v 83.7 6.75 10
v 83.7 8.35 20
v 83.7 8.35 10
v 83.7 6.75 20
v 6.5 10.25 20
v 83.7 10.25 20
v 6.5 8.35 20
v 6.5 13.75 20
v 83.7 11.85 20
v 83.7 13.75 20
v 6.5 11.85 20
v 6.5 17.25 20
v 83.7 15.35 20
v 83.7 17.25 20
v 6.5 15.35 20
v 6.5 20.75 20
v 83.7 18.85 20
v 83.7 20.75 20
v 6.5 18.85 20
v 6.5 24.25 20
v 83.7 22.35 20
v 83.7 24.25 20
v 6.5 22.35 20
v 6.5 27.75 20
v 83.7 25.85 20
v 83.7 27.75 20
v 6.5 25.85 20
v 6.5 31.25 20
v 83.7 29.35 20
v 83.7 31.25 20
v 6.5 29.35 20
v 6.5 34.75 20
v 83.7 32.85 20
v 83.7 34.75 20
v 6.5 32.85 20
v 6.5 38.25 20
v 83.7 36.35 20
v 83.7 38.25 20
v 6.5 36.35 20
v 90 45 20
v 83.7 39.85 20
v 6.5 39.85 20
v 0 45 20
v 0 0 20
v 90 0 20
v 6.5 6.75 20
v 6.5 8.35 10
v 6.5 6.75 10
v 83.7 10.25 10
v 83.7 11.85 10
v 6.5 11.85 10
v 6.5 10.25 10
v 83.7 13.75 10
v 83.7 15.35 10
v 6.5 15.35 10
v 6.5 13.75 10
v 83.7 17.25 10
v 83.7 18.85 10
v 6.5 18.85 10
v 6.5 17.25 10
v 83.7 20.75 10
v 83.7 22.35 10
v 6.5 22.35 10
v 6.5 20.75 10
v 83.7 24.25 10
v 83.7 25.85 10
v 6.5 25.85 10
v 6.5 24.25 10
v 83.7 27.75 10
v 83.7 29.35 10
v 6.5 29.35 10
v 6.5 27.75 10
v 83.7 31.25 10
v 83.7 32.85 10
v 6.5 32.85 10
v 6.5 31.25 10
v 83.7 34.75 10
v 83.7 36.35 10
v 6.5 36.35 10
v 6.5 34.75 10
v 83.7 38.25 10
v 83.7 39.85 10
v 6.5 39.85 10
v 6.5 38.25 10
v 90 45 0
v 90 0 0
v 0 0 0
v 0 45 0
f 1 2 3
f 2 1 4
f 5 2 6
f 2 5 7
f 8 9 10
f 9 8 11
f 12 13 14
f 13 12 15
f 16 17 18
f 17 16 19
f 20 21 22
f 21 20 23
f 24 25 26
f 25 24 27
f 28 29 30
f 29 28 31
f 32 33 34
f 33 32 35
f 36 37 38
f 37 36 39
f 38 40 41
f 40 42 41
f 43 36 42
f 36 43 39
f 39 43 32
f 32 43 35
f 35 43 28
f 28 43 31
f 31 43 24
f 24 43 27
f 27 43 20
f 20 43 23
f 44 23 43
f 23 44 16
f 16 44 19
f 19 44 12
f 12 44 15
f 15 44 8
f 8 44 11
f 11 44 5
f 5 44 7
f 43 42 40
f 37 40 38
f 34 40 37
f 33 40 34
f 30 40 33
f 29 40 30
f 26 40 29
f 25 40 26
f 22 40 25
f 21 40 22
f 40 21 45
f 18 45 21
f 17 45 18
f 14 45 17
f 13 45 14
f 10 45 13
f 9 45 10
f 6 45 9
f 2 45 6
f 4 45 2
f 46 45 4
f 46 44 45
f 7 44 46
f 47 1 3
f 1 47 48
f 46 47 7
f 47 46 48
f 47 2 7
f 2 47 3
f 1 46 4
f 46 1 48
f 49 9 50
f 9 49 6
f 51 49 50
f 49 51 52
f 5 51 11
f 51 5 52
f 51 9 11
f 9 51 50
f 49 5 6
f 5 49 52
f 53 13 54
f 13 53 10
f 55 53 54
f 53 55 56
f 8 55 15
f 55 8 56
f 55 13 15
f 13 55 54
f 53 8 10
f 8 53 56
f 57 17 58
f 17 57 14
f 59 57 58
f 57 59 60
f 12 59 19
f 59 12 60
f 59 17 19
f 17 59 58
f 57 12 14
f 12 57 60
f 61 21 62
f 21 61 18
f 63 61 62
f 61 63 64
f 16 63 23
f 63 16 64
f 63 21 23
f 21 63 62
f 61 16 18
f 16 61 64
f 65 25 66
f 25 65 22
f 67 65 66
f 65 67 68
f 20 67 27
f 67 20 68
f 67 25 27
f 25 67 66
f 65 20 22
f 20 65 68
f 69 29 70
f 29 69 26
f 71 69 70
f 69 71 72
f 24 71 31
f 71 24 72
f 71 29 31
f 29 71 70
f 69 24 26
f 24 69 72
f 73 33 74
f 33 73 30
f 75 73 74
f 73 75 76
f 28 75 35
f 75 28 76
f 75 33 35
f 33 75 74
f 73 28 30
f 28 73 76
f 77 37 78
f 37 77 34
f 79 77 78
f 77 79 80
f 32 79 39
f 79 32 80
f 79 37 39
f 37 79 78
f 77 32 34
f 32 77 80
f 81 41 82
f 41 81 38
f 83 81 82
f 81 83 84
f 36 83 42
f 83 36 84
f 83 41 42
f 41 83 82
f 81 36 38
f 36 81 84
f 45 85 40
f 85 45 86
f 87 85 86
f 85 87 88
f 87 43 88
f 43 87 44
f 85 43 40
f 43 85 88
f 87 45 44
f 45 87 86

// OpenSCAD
// Drying Rack for 10 Microscope Slides
// Base: 90 x 45 x 20 mm (Resting on Z=0)
// Slots: 10 parallel slots along X, 77mm long, 1.6mm wide, 10mm deep
// Spacing: 3.5mm centre-to-centre in Y
// Centering: Slots centered on the block in both X and Y.

$fn = 128;

// Base Dimensions
base_length = 90;
base_width = 45;
base_height = 20;

// Slide Dimensions (for reference)
slide_length = 75;
slide_width = 25;
slide_thickness = 1;

// Slot Dimensions
num_slots = 10;
slot_length = 77;
slot_width = 1.6;
slot_depth = 10;
slot_spacing = 3.5; // Centre-to-centre in Y

// Calculate Y position of the first slot centre
// The group of slots is centred on the block in Y.
total_span = (num_slots - 1) * slot_spacing;
y_offset = (base_width - total_span) / 2;

// Build the solid base block starting at Z=0
difference() {
    // Main block: 90 x 45 x 20, resting on Z=0
    // Centered at (45, 22.5, 10) relative to origin, but we want it at Z=0.
    // So we define it from 0 to 20 in Z.
    cube([base_length, base_width, base_height], center = false);
    
    // Cut the 10 slots
    // Slots run along X.
    // We cut from the top surface (Z=20) downwards to Z=10.
    // The cut shape must extend slightly past the slot length in X to ensure clean cut 
    // and avoid coplanar faces on the slot walls.
    cut_extension = 0.1; 
    
    for (i = [0 : num_slots - 1]) {
        // Calculate Y position for this specific slot
        y_pos = y_offset + i * slot_spacing;
        
        // Calculate X position to center the slot on the 90mm block
        // Block X range: 0 to 90. Center: 45.
        // Slot X range: 45 - (77/2) to 45 + (77/2) = 7.5 to 82.5
        x_pos = (base_length - slot_length) / 2;
        
        // Define the slot geometry
        // The slot is a rectangular prism cut into the top face.
        // It runs along X, has width in Y, and depth in Z.
        
        translate([x_pos, y_pos, base_height - slot_depth]) {
            // Cut shape: 
            // X: slot_length + 2*extension (extends past both ends)
            // Y: slot_width
            // Z: slot_depth (extends from current Z up to base_height)
            cube([slot_length + 2*cut_extension, slot_width, slot_depth], center = false);
        }
    }
}
